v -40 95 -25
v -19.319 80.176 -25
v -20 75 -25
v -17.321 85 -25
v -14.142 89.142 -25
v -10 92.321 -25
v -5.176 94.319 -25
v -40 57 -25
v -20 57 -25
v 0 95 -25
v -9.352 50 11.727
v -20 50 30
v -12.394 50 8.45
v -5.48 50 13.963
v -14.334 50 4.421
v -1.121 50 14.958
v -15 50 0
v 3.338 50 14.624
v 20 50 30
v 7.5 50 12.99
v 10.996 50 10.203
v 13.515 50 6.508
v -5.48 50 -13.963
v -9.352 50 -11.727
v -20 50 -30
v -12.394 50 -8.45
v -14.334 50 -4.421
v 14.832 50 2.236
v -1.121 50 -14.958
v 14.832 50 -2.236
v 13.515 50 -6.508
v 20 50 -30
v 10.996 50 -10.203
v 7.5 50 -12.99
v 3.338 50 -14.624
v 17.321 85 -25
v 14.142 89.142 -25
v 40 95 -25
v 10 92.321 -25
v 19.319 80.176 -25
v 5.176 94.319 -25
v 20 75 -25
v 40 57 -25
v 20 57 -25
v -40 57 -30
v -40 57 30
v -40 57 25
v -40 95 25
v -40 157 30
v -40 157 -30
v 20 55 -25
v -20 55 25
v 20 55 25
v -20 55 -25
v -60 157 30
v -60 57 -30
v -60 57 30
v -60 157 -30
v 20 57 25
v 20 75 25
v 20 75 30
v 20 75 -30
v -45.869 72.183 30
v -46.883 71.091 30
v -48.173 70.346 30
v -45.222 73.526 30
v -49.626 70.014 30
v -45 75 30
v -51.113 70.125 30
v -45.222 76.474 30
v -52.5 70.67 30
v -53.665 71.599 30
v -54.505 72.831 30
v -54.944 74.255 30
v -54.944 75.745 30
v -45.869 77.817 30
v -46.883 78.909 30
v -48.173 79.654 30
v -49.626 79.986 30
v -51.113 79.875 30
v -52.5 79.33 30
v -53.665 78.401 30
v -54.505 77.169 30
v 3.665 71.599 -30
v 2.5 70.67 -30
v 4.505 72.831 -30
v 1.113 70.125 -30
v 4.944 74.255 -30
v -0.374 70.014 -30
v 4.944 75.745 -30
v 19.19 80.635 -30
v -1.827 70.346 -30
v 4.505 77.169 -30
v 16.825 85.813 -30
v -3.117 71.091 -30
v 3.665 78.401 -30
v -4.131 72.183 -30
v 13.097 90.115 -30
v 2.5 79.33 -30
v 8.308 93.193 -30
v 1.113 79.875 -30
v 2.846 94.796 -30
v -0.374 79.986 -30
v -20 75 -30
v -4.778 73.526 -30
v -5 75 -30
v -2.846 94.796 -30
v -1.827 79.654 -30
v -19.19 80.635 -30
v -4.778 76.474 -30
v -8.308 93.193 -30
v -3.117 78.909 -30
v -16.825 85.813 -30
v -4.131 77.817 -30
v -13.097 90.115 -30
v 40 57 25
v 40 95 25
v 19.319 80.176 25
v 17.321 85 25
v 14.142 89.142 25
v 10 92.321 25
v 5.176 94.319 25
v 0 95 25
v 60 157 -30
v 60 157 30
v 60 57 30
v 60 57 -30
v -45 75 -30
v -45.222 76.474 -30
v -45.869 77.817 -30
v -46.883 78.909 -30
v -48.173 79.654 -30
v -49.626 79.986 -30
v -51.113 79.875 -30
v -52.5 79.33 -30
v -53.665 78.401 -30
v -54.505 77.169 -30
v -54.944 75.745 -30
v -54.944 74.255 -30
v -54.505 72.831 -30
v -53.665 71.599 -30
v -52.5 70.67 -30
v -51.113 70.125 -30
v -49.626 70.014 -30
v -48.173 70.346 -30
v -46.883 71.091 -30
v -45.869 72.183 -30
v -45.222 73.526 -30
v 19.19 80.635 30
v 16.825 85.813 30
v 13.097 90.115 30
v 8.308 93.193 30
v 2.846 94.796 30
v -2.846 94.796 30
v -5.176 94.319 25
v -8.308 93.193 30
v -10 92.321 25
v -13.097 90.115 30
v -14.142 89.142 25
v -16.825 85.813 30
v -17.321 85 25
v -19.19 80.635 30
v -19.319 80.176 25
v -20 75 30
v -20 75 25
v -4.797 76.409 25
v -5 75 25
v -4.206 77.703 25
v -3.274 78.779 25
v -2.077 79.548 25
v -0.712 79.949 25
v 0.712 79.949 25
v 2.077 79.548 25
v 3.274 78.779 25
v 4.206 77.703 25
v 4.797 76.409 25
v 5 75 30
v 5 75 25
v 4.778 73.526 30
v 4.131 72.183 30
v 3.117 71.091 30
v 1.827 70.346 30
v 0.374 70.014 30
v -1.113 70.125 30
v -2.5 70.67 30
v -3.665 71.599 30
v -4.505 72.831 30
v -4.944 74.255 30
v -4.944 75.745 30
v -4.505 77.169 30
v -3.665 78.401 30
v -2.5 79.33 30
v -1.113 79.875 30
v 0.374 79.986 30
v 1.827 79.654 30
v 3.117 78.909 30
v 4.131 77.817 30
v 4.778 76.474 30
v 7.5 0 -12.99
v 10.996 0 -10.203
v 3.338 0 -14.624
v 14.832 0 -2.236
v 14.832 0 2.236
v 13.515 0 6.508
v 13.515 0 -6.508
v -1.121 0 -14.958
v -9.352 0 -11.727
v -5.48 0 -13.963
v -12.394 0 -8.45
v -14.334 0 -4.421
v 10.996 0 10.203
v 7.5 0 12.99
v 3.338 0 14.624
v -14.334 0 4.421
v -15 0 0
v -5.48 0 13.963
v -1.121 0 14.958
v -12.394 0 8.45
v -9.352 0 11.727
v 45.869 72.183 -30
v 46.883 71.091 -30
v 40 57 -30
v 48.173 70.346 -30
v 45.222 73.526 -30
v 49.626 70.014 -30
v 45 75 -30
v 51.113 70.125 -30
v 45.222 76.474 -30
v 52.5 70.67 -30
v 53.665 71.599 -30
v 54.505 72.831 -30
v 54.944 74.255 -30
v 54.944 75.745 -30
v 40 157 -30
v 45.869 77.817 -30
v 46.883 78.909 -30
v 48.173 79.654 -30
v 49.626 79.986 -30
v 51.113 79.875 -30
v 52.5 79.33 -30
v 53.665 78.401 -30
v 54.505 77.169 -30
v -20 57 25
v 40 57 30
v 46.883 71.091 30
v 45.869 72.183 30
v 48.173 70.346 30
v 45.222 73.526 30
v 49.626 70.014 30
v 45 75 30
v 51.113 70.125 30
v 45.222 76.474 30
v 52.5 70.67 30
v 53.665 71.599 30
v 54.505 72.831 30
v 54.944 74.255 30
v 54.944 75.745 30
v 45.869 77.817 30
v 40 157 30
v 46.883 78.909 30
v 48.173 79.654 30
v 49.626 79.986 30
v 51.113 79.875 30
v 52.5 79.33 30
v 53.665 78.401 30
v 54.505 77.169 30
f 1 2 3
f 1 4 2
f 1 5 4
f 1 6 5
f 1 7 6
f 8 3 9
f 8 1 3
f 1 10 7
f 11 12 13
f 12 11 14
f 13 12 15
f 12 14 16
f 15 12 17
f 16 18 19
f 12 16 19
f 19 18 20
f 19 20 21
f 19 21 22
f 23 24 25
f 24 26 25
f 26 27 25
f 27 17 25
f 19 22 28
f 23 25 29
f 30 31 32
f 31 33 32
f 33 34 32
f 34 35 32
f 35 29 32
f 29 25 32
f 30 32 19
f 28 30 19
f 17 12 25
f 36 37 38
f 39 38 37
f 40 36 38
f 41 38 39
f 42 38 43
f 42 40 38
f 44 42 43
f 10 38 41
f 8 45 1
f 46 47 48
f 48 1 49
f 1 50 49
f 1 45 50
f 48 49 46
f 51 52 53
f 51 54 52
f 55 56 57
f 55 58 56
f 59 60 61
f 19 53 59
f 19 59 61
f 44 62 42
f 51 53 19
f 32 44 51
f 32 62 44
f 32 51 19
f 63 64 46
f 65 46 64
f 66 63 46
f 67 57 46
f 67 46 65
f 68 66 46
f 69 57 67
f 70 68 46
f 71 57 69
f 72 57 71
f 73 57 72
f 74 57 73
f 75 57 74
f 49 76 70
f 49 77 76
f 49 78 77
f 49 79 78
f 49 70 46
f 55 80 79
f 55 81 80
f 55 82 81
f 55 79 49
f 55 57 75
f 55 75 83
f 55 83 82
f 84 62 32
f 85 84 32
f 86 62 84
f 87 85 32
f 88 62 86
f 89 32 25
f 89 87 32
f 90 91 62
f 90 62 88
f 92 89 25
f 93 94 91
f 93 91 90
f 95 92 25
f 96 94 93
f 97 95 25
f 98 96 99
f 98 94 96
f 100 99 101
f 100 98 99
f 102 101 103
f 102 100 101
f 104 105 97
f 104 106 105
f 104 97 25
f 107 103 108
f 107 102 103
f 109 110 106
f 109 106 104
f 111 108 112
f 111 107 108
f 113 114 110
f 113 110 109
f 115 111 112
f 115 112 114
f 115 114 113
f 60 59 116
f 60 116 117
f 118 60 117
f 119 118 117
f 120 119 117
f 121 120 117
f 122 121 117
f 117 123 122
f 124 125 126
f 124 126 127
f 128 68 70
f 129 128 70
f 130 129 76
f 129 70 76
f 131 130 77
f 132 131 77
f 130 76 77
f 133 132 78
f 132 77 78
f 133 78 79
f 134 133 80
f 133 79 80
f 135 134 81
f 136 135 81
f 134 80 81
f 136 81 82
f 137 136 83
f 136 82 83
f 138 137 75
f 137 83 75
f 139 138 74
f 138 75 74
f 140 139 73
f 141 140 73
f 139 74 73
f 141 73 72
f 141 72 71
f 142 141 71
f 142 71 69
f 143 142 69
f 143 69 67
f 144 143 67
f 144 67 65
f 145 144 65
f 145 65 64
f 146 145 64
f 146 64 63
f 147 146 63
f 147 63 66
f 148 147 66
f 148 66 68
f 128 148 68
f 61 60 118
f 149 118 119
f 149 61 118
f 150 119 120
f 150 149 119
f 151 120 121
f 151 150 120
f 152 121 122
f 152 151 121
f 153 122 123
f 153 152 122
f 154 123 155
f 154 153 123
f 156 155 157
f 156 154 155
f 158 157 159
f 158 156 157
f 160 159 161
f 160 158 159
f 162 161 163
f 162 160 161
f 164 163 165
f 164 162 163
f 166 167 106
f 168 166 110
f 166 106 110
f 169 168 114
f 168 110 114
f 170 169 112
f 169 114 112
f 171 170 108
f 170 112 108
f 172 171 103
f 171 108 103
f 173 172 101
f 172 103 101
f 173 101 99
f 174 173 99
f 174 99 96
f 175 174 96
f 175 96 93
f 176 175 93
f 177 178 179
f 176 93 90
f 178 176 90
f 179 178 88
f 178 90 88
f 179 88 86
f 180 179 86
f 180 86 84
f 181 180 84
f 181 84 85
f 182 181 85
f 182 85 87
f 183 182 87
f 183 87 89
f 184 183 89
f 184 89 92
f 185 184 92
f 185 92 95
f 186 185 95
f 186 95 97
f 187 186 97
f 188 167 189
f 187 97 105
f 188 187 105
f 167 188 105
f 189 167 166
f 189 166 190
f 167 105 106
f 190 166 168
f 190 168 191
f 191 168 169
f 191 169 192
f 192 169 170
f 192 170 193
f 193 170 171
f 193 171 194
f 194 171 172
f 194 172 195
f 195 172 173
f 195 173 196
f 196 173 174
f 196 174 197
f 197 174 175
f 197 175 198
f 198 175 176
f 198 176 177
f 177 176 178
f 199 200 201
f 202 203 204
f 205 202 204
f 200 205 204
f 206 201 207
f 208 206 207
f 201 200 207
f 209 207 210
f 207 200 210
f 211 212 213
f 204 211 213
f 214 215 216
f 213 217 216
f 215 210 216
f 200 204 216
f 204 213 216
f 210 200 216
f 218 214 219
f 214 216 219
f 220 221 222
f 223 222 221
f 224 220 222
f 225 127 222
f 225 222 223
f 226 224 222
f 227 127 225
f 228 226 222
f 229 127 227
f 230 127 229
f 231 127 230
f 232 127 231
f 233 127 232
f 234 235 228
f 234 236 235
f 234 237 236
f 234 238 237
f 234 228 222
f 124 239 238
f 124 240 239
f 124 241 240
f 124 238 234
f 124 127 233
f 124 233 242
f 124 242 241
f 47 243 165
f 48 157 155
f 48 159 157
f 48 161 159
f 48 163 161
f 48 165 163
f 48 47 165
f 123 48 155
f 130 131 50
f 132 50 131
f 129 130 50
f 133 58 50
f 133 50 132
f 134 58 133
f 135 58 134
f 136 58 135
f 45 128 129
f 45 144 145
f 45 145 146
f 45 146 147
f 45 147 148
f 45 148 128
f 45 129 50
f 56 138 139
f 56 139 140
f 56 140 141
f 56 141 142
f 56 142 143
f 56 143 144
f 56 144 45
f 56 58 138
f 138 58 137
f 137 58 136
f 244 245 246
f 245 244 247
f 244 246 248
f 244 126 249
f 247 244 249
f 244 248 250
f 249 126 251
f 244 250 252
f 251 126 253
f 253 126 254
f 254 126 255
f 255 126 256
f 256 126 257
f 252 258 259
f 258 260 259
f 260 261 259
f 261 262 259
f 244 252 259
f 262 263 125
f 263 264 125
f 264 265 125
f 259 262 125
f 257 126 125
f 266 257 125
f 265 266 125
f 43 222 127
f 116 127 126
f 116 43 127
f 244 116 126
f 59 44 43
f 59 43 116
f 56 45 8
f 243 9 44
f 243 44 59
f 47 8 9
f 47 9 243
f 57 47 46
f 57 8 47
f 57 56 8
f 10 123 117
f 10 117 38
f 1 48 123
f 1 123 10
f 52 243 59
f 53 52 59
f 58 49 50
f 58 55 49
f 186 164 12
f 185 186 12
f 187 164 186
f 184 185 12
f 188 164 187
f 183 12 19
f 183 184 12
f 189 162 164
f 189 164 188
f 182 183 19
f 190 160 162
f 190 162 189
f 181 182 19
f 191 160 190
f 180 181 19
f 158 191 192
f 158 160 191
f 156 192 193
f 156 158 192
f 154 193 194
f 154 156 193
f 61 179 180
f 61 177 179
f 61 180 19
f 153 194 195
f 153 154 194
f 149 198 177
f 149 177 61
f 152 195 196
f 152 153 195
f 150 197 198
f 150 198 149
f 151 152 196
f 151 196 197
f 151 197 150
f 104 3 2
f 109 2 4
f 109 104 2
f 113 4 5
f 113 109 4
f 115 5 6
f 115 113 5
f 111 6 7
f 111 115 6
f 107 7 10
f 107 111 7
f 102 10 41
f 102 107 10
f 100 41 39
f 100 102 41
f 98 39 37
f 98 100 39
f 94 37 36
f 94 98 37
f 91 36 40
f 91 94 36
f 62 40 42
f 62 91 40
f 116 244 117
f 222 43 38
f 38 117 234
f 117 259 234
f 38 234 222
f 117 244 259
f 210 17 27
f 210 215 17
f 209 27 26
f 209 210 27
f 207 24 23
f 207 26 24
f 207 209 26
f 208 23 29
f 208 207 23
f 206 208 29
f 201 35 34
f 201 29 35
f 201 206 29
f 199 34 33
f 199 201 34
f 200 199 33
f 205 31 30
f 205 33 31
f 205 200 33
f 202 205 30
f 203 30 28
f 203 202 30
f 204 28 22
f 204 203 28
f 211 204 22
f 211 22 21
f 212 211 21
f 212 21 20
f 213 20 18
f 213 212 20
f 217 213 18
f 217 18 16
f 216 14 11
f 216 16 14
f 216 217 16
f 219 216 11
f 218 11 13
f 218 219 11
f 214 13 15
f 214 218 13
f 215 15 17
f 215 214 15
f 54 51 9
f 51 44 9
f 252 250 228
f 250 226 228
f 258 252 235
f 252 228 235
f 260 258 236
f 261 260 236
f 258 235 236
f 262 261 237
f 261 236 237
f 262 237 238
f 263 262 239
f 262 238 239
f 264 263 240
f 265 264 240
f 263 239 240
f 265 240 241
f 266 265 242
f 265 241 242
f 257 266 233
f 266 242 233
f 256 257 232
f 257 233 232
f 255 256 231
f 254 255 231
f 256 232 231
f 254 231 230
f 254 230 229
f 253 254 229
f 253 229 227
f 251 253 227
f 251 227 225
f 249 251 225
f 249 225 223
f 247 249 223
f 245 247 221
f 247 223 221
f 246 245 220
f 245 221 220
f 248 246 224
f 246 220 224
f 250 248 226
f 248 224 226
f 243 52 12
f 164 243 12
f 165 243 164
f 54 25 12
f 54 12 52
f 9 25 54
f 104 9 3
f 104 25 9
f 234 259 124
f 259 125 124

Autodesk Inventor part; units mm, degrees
ref_plane "YZ Plane" through (0, 0, 0) normal (1, 0, 0) x (0, 1, 0)
sketch "Boceto1" plane through (0, 0, 0) normal (0, 1, 0) x (-1, 0, 0)
  circle A0 centre (0, 0) radius 15
  dimension "d0" = 30
extrude "Extrusión1" add sketch "Boceto1" along normal blind 50
sketch "Boceto2" plane through (0, 50, 0) normal (0, 1, 0) x (1, 0, 0)
  line L0 (20, 30) -> (-20, 30)
  line L1 (-20, 30) -> (-20, -30)
  line L2 (-20, -30) -> (20, -30)
  line L3 (20, -30) -> (20, 30)
  line L4 (20, 30) -> (-20, -30) construction
  line L5 (-20, 30) -> (20, -30) construction
  point P0 (0, 0)
  dimension "d3" = 60
  dimension "d4" = 40
extrude "Extrusión2" add sketch "Boceto2" along normal blind 5
sketch "Boceto3" plane through (-20, 50, 30) normal (0, 0, 1) x (1, 0, 0)
  line L0 (0, 5) -> (0, 25)
  line L1 (40, 5) -> (0, 5) projected
  line L2 (40, 5) -> (40, 25)
  arc A0 (40, 25) -> (0, 25) centre (20, 25) ccw
  circle A1 centre (20, 25) radius 5
  point P0 (20, -50)
  dimension "d7" = 20
  dimension "d8" = 20
  dimension "d9" = 10
extrude "Extrusión3" add sketch "Boceto3" against normal blind 5
sketch "Boceto4" plane through (20, 50, -30) normal (0, 0, -1) x (-1, 0, 0)
  circle A0 centre (20, 25) radius 5 projected
  arc A1 (40, 25) -> (0, 25) centre (20, 25) ccw projected
  line L0 (40, 5) -> (40, 25) projected
  line L1 (0, 5) -> (40, 5) projected
  line L2 (0, 25) -> (0, 5) projected
  point P0 (20, -50)
extrude "Extrusión4" add sketch "Boceto4" against normal blind 5
sketch "Boceto5" plane through (20, 50, 30) normal (1, 0, 0) x (0, 0, -1)
  point P0 (30, -50)
ref_plane "Plano de trabajo1" through (0, 50, 30) normal (1, 0, 0) x (0, 0, -1)
ref_plane "Plano de trabajo2" through (-20, 50, 0) normal (0, 0, 1) x (1, 0, 0)
sketch "Boceto6" plane through (0, 50, 30) normal (1, 0, 0) x (0, 0, -1)
  line L0 (5, 25) -> (5, 45) projected
  line L1 (55, 7) -> (5, 7)
  line L2 (5, 7) -> (5, 45)
  line L3 (5, 45) -> (55, 45)
  line L4 (55, 45) -> (55, 7)
  line L5 (55, 7) -> (5, 45) construction
  line L6 (5, 7) -> (55, 45) construction
  point P0 (30, -50)
  point P1 (30, 26)
extrude "Extrusión5" add sketch "Boceto6" along normal mid plane 120
sketch "Boceto7" plane through (20, 50, -30) normal (0, 0, -1) x (-1, 0, 0)
  circle A0 centre (20, 25) radius 5 projected
  point P0 (20, -50)
extrude "Extrusión6" cut sketch "Boceto7" against normal up to next
sketch "Boceto8" plane through (60, 50, 30) normal (1, 0, 0) x (0, 0, -1)
  line L0 (55, 7) -> (55, 5) projected
  line L1 (55, 7) -> (60, 7)
  line L2 (60, 7) -> (60, 107)
  line L3 (0, 7) -> (0, 107)
  line L4 (0, 107) -> (60, 107)
  line L5 (5, 25) -> (5, 7) projected
  line L6 (0, 7) -> (5, 7)
  line L7 (5, 7) -> (5, 45)
  line L8 (55, 45) -> (5, 45) projected
  line L9 (5, 45) -> (55, 45)
  line L10 (55, 45) -> (55, 7)
  point P0 (30, -50)
  dimension "d23" = 100
extrude "Extrusión7" add sketch "Boceto8" against normal blind 20
sketch "Boceto9" plane through (60, 57, -30) normal (0, 0, -1) x (-1, 0, 0)
  circle A0 centre (10, 18) radius 5
  point P0 (60, -57)
  dimension "d27" = 10
extrude "Extrusión8" cut sketch "Boceto9" against normal up to next
sketch "Boceto10" plane through (-60, 50, 30) normal (-1, 0, 0) x (0, 0, 1)
  line L0 (-60, 107) -> (-60, 7) projected
  line L1 (-5, 45) -> (-55, 45) projected
  line L2 (0, 107) -> (-60, 107) projected
  line L3 (-60, 7) -> (-55, 7) projected
  line L4 (-55, 45) -> (-55, 7) projected
  line L5 (-5, 45) -> (-55, 45) projected
  line L6 (-5, 7) -> (-5, 45) projected
  line L7 (-5, 7) -> (0, 7) projected
  line L8 (0, 7) -> (0, 107) projected
  line L9 (0, 107) -> (-60, 107) projected
  line L10 (-60, 107) -> (-60, 7) projected
  point P0 (-30, -50)
extrude "Extrusión9" add sketch "Boceto10" against normal blind 20
sketch "Boceto11" plane through (-60, 57, 30) normal (0, 0, 1) x (1, 0, 0)
  circle A0 centre (10, 18) radius 5
  point P0 (60, -57)
  dimension "d33" = 10
extrude "Extrusión10" cut sketch "Boceto11" against normal up to next
properties part number "pinza"
